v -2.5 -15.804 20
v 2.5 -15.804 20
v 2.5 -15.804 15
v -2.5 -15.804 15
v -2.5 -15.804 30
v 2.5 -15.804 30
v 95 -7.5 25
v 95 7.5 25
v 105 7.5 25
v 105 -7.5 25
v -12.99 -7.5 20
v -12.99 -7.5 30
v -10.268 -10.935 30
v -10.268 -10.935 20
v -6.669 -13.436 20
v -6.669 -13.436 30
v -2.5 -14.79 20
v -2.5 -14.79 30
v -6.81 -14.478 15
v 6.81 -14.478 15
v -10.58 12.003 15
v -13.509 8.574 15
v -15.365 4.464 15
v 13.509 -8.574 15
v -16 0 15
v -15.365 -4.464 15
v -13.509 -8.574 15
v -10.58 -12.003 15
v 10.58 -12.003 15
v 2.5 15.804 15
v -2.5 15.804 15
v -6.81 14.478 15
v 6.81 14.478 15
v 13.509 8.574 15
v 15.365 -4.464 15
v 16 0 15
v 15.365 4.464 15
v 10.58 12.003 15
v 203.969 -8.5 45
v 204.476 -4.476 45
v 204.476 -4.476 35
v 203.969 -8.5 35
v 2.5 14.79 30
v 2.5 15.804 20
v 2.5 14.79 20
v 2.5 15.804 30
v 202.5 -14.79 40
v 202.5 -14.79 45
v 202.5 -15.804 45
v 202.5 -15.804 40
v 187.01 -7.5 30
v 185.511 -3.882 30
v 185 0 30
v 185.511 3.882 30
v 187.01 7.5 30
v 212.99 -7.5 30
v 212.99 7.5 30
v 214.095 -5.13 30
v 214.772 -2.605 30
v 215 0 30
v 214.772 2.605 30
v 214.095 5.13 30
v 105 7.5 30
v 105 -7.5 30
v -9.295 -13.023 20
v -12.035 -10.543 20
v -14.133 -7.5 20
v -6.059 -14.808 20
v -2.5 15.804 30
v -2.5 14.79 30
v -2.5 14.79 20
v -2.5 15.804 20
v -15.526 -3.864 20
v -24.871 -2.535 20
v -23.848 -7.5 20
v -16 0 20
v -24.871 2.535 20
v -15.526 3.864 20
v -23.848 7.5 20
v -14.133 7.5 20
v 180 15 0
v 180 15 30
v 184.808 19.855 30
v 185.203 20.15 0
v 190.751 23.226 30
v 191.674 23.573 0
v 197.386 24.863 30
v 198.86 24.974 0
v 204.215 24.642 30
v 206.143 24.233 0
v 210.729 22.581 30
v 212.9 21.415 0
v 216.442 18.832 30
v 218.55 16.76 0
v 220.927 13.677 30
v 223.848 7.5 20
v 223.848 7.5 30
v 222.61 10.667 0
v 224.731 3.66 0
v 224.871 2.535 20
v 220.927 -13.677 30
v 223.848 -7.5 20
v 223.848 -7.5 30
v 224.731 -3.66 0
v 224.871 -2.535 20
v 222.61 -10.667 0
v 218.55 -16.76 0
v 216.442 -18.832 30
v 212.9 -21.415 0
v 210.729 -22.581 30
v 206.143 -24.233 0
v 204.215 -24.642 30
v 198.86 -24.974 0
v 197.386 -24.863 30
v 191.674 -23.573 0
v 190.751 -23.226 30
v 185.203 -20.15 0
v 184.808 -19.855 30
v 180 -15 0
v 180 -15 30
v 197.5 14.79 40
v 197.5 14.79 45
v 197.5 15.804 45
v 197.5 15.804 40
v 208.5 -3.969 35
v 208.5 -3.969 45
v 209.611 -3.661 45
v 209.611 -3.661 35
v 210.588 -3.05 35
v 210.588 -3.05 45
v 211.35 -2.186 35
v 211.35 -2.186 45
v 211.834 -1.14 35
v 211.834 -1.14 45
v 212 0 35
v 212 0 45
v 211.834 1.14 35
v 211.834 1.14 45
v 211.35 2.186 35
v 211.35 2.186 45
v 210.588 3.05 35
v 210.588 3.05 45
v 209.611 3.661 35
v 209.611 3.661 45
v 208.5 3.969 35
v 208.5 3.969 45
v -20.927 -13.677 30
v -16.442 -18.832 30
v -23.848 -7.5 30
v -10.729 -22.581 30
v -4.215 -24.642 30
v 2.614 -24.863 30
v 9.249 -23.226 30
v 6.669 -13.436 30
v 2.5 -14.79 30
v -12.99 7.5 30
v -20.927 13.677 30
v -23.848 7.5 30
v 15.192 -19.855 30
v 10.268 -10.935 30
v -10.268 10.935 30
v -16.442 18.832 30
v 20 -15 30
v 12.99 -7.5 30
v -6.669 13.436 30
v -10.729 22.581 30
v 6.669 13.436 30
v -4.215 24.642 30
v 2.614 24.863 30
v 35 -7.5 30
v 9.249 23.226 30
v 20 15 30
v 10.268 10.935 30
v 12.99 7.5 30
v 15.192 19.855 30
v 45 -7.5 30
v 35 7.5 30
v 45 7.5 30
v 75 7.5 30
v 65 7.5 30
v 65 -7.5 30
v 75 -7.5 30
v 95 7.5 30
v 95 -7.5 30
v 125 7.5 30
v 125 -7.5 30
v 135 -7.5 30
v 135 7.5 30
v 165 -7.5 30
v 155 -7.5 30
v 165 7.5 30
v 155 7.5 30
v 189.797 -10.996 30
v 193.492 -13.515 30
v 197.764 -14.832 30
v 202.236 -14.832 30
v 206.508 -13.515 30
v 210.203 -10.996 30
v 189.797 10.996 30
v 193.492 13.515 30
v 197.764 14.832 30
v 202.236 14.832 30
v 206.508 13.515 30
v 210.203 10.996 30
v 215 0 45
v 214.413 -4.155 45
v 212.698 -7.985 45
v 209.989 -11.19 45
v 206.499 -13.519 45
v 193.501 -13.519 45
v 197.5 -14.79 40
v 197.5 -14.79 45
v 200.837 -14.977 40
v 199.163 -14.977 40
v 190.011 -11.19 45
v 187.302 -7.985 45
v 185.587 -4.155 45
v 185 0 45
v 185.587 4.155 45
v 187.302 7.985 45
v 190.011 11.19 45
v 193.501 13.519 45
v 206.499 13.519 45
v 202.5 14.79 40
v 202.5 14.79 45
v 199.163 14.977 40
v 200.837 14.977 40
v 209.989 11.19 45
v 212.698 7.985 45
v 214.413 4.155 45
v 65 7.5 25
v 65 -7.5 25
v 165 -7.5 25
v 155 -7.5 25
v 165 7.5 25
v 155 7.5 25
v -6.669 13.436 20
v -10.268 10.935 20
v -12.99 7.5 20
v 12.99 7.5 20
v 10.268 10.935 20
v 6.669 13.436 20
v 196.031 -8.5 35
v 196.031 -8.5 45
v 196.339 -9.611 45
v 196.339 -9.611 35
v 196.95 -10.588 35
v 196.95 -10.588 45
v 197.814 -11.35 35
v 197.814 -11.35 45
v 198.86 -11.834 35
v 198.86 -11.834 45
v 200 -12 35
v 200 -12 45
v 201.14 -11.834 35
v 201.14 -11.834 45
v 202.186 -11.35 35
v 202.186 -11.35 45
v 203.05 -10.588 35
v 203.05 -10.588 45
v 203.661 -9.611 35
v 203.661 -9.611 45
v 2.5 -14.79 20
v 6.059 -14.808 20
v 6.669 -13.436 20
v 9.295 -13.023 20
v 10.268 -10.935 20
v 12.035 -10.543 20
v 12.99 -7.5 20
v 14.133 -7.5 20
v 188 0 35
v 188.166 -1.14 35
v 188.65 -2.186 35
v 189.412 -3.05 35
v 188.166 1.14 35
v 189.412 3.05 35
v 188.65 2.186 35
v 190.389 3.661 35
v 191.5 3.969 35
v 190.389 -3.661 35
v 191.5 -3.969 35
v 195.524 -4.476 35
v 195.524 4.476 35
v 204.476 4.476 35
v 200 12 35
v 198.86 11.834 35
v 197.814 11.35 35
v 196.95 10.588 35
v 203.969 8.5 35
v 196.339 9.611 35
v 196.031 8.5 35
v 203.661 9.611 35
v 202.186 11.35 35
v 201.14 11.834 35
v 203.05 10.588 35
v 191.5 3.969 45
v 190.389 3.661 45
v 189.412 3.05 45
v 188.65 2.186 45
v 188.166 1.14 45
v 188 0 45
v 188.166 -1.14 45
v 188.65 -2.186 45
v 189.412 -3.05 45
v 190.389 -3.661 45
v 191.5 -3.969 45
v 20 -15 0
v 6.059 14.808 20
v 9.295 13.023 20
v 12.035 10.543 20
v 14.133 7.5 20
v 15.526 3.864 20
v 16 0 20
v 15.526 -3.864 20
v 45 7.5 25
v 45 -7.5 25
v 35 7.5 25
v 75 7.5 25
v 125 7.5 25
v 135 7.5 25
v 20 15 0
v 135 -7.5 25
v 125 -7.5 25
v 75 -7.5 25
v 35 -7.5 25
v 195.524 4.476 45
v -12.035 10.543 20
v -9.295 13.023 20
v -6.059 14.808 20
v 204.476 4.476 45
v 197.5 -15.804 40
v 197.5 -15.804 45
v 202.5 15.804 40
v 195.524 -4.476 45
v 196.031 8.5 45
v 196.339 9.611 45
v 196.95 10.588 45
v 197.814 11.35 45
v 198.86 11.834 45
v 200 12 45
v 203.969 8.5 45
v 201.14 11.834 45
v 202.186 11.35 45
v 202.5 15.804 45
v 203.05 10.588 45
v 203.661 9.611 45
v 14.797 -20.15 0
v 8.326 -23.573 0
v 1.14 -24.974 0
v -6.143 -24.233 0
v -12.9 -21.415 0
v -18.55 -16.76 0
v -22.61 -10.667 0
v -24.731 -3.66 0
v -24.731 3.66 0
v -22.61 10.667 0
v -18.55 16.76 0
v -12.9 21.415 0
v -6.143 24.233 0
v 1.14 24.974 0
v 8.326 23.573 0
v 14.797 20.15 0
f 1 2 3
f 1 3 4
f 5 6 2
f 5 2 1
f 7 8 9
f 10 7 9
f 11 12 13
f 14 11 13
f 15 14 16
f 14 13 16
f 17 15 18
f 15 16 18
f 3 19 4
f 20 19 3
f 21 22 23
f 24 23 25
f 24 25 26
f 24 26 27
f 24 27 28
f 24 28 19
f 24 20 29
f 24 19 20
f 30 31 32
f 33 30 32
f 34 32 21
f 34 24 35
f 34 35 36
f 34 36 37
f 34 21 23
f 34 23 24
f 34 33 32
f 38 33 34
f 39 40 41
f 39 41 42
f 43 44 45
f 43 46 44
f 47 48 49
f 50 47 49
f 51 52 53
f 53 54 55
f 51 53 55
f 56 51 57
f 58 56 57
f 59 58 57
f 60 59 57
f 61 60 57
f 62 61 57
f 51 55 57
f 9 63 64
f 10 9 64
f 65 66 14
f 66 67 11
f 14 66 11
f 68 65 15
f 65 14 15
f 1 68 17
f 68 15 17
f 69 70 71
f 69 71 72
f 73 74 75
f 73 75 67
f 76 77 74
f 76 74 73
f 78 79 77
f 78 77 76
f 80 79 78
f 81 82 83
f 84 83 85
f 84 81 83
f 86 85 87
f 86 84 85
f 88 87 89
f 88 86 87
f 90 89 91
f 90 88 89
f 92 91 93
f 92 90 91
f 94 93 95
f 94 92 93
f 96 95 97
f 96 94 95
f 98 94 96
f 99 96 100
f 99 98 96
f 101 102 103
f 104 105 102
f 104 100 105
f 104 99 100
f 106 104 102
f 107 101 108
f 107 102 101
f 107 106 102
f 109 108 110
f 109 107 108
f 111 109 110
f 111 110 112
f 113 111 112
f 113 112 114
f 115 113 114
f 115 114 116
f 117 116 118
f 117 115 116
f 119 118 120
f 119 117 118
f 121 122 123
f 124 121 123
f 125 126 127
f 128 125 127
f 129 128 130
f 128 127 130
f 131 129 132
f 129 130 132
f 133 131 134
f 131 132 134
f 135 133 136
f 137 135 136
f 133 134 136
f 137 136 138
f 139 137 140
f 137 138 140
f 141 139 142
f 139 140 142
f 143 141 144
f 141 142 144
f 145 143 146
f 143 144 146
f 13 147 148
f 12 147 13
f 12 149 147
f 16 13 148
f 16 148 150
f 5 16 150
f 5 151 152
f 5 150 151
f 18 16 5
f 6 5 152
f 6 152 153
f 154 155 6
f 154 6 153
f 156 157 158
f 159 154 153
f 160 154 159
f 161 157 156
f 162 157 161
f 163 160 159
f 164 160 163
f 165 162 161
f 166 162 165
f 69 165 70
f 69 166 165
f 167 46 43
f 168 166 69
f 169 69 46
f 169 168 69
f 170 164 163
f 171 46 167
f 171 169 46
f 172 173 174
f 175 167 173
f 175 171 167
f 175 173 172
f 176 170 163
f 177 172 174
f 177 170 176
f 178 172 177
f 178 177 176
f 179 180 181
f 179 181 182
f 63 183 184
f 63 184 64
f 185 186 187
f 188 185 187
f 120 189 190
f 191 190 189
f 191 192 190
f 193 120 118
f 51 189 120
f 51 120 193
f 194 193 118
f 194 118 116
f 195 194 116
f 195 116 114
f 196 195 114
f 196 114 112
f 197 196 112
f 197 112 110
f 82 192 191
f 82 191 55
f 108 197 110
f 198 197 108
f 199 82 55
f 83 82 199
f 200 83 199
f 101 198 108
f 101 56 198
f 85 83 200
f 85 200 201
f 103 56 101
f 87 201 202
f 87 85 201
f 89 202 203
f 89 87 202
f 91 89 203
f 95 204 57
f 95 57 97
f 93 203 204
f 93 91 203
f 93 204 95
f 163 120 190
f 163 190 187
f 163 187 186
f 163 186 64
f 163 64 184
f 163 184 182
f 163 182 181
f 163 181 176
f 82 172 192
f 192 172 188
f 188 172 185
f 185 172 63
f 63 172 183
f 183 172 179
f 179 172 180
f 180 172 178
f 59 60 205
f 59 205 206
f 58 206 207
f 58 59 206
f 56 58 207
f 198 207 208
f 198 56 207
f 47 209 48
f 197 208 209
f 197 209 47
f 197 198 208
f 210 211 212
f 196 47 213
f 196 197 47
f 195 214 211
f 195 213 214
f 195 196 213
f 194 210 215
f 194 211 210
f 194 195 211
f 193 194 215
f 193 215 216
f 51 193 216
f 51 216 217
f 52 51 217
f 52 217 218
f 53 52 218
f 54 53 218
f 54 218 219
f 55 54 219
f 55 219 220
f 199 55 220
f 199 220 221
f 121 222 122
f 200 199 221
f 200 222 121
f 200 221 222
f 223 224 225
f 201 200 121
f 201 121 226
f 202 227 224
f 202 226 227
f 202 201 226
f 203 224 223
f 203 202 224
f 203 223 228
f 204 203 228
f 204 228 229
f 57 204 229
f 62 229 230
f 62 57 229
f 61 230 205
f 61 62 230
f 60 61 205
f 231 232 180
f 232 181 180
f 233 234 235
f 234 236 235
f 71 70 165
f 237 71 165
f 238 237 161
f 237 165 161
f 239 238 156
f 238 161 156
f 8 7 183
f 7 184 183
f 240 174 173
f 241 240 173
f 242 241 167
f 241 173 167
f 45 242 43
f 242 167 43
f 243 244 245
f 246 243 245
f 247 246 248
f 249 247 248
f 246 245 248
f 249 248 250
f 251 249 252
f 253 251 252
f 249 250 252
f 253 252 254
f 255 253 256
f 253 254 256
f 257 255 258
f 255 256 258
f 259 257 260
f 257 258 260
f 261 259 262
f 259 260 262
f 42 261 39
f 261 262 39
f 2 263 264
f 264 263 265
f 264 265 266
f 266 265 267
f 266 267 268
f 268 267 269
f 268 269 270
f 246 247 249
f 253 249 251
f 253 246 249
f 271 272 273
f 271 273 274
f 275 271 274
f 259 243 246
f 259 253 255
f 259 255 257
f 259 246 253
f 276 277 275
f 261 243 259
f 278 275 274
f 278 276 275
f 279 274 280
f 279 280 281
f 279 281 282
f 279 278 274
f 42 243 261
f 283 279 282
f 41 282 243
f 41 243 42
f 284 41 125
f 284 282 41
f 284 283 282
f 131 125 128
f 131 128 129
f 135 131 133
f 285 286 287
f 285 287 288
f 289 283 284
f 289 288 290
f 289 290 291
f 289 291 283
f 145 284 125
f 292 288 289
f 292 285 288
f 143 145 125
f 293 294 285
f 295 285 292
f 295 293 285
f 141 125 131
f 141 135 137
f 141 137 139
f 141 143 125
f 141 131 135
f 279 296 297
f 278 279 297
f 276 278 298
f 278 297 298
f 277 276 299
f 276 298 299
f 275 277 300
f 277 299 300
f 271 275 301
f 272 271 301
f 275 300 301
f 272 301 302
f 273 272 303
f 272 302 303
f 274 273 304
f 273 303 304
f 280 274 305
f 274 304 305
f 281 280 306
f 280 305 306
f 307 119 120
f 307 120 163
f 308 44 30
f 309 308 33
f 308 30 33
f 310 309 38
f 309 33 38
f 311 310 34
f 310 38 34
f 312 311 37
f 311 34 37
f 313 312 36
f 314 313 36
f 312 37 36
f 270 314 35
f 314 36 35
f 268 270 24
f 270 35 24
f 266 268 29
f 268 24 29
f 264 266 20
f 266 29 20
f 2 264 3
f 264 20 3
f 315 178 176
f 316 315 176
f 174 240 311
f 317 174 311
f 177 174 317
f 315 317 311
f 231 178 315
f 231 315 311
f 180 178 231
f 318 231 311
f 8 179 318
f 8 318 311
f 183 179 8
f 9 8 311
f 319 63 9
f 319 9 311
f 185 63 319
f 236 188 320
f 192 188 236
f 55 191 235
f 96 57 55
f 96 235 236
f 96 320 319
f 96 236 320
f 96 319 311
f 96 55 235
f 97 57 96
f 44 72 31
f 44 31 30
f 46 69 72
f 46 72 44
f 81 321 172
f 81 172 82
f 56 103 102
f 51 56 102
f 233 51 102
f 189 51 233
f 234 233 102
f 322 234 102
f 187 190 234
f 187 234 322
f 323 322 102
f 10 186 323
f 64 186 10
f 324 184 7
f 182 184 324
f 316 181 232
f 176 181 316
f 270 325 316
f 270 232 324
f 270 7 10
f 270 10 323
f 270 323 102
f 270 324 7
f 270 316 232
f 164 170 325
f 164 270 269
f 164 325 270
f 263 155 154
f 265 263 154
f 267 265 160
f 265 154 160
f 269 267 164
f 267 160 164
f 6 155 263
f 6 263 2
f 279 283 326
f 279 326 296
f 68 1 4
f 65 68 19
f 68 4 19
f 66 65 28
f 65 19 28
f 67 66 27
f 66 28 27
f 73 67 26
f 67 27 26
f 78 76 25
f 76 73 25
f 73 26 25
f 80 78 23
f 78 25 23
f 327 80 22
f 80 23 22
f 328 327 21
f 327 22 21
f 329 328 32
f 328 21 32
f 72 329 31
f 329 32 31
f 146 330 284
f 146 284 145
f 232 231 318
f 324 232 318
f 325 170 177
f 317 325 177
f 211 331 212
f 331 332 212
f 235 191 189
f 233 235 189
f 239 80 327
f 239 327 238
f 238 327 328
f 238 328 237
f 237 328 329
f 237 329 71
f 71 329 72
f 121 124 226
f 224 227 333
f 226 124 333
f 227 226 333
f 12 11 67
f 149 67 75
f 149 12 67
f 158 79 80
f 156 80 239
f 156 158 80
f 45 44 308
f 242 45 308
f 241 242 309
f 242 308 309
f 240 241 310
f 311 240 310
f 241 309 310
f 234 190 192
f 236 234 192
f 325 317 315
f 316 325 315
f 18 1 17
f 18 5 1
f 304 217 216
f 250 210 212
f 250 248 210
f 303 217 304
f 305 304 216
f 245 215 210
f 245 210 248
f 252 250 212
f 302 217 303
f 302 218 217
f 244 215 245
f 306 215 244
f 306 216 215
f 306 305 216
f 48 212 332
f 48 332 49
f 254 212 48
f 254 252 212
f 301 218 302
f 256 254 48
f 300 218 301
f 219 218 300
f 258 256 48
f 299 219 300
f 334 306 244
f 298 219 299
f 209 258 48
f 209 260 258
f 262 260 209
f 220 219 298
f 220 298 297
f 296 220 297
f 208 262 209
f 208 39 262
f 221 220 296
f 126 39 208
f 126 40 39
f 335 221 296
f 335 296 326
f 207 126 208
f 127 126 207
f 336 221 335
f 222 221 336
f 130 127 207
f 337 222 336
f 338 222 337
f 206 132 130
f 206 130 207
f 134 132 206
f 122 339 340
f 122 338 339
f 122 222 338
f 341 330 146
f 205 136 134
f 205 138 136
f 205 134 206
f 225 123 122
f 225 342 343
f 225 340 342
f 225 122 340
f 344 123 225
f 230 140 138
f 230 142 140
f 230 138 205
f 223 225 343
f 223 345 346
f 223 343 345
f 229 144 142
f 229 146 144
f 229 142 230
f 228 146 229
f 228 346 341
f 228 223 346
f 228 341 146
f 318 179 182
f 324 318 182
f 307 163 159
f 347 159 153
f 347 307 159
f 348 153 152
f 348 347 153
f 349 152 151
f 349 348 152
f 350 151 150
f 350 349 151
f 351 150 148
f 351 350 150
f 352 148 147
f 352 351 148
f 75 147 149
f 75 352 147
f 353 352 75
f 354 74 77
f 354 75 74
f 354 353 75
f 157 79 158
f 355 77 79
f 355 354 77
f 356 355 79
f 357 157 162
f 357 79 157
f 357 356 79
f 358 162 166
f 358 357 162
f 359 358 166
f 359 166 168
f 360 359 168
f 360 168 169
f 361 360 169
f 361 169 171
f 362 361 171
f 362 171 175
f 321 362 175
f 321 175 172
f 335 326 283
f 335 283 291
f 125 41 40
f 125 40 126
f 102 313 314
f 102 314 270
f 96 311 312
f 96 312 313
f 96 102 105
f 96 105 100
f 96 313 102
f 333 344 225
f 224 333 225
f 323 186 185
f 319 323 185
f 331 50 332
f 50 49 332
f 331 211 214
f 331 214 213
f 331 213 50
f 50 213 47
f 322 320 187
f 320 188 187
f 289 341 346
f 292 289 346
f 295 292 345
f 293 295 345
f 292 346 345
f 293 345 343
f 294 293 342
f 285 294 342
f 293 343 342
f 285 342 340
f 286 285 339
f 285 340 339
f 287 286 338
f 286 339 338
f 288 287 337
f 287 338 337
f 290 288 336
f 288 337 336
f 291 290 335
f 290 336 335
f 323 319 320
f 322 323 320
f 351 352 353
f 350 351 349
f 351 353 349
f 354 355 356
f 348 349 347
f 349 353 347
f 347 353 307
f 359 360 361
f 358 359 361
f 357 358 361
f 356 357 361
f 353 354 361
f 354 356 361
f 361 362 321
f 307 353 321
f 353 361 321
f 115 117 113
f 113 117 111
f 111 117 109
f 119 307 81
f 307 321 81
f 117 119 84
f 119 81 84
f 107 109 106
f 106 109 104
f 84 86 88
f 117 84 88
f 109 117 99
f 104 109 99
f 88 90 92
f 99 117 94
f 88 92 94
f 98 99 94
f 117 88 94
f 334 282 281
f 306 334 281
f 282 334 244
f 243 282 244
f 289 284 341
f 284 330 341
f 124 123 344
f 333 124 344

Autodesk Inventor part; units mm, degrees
ref_plane "YZ Plane" through (0, 0, 0) normal (1, 0, 0) x (0, 1, 0)
ref_plane "XZ Plane" through (0, 0, 0) normal (0, 1, 0) x (-1, 0, 0)
ref_plane "XY Plane" through (0, 0, 0) normal (0, 0, 1) x (1, 0, 0)
sketch "Szkic1" plane through (0, 0, 0) normal (0, 0, 1) x (1, 0, 0)
  arc A0 (20, 15) -> (-20, 15) centre (0, 0) ccw
  line L0 (20, 15) -> (100, 15)
  line L1 (100, 15) -> (100, -15)
  line L2 (100, -15) -> (20, -15)
  arc A1 (180, -15) -> (180, 15) centre (200, 0) ccw
  line L3 (180, 15) -> (100, 15)
  line L4 (100, -15) -> (180, -15)
  arc A2 (-20, 15) -> (20, -15) centre (0, 0) ccw
  dimension "d0" = 50
  dimension "d1" = 30
  dimension "d2" = 200
extrude "kształt" add sketch "Szkic1" along normal blind 30
sketch "Szkic2" plane through (0, 0, 30) normal (0, 0, 1) x (1, 0, 0)
  arc A0 (20, 15) -> (20, -15) centre (0, 0) ccw projected
  line L0 (20, -15) -> (180, -15) projected
  arc A1 (180, -15) -> (180, 15) centre (200, 0) ccw projected
  line L1 (180, 15) -> (20, 15) projected
  line L2 (-23.8485, 7.5) -> (223.8485, 7.5)
  line L3 (223.8485, -7.5) -> (-73.8485, -7.5)
  point P0 (-23.8485, -7.5)
  dimension "d5" = 15
extrude "rowek na kable" cut sketch "Szkic2" against normal blind 10 contours L2 A1 L3 A0
sketch "Szkic3" plane through (0, 0, 30) normal (0, 0, 1) x (1, 0, 0)
  arc A0 (223.8485, 7.5) -> (180, 15) centre (200, 0) ccw projected
  circle A1 centre (200, 0) radius 15
  point P0 (0, 0)
  dimension "d8" = 30
extrude "odstająćy cosik" add sketch "Szkic3" along normal blind 15
sketch "Szkic4" plane through (0, 0, 30) normal (0, 0, 1) x (1, 0, 0)
  circle A0 centre (0, 0) radius 15
  dimension "d11" = 30
extrude "wgłebiający cosik" cut sketch "Szkic4" against normal blind 15
sketch "Szkic5" plane through (0, 0, 30) normal (0, 0, 1) x (1, 0, 0)
  arc A0 (12.9904, 7.5) -> (-12.9904, 7.5) centre (0, 0) ccw projected
  line L0 (12.9904, 7.5) -> (187.0096, 7.5) projected
  arc A1 (212.9904, 7.5) -> (187.0096, 7.5) centre (200, 0) ccw projected
  line L1 (212.9904, 7.5) -> (223.8485, 7.5) projected
  arc A2 (223.8485, 7.5) -> (180, 15) centre (200, 0) ccw projected
  line L2 (180, 15) -> (20, 15) projected
  arc A3 (20, 15) -> (-23.8485, 7.5) centre (0, 0) ccw projected
  line L3 (-23.8485, 7.5) -> (-12.9904, 7.5) projected
  arc A4 (-12.9904, -7.5) -> (12.9904, -7.5) centre (0, 0) ccw projected
  line L4 (-12.9904, -7.5) -> (-23.8485, -7.5) projected
  arc A5 (-23.8485, -7.5) -> (20, -15) centre (0, 0) ccw projected
  line L5 (20, -15) -> (180, -15) projected
  arc A6 (180, -15) -> (223.8485, -7.5) centre (200, 0) ccw projected
  line L6 (223.8485, -7.5) -> (212.9904, -7.5) projected
  arc A7 (187.0096, -7.5) -> (212.9904, -7.5) centre (200, 0) ccw projected
  line L7 (187.0096, -7.5) -> (12.9904, -7.5) projected
  line L8 (35, 7.5) -> (45, 7.5)
  line L9 (45, 7.5) -> (45, -7.5)
  line L10 (45, -7.5) -> (35, -7.5)
  line L11 (35, -7.5) -> (35, 7.5)
  arc A8 (-23.8485, -7.5) -> (20, -15) centre (0, 0) ccw projected
  line L12 (65, -7.5) -> (65, 7.5)
  line L13 (75, 7.5) -> (75, -7.5)
  line L14 (75, -7.5) -> (65, -7.5)
  line L15 (65, 7.5) -> (75, 7.5)
  line L16 (95, -7.5) -> (95, 7.5)
  line L17 (105, 7.5) -> (105, -7.5)
  line L18 (105, -7.5) -> (95, -7.5)
  line L19 (95, 7.5) -> (105, 7.5)
  line L20 (125, -7.5) -> (125, 7.5)
  line L21 (135, 7.5) -> (135, -7.5)
  line L22 (135, -7.5) -> (125, -7.5)
  line L23 (125, 7.5) -> (135, 7.5)
  line L24 (155, -7.5) -> (155, 7.5)
  line L25 (165, 7.5) -> (165, -7.5)
  line L26 (165, -7.5) -> (155, -7.5)
  line L27 (155, 7.5) -> (165, 7.5)
  arc A9 (223.8485, 7.5) -> (180, 15) centre (200, 0) ccw projected
  line L28 (0, 0) -> (100, 0) construction
  line L29 (100, -7.5) -> (100, 7.5) construction
  line L30 (100, 0) -> (200, 0) construction
  point P0 (35, -7.5)
  point P1 (75, -7.5)
  point P2 (75, 7.5)
  point P3 (65, 7.5)
  point P4 (165, -7.5)
  point P5 (165, 7.5)
  point P6 (155, 7.5)
  point P7 (155, -7.5)
  point P8 (135, -7.5)
  point P9 (135, 7.5)
  point P10 (125, 7.5)
  point P11 (105, -7.5)
  point P12 (105, 7.5)
  point P13 (95, 7.5)
  dimension "d15" = 10
  dimension "d18" = 30
extrude "wzmocnienie" add sketch "Szkic5" against normal blind 5 contours L0 L9 L7 L11 | L0 L13 L7 L12 | L0 L17 L7 L16 | L0 L21 L7 L20 | L25 L7 L24 L0
sketch "Szkic6" plane through (200, 0, 45) normal (0, 0, 1) x (1, 0, 0)
  circle A0 centre (0, 0) radius 15 projected
  arc A1 (2.5, 15.8035) -> (2.5, -15.8035) centre (0, 0) ccw construction
  line L0 (-2.5, 15.8035) -> (2.5, 15.8035)
  line L1 (2.5, 15.8035) -> (2.5, 14.7902)
  line L2 (2.5, -15.8035) -> (-2.5, -15.8035)
  line L3 (-2.5, -15.8035) -> (-2.5, -14.7902)
  line L4 (2.5, 14.7902) -> (2.5, -14.7902) construction
  line L5 (-2.5, 14.7902) -> (-2.5, 15.8035)
  line L6 (-2.5, -14.7902) -> (-2.5, 14.7902) construction
  line L7 (2.5, -14.7902) -> (2.5, -15.8035)
  point P0 (-200, 0)
  dimension "d25" = 32
  dimension "d27" = 5
extrude "złobek" add sketch "Szkic6" against normal blind 5 contours A0 L5 L0 L1 | L7 L2 L3 A0
sketch "Szkic7" plane through (0, 0, 30) normal (0, 0, 1) x (1, 0, 0)
  circle A0 centre (0, 0) radius 16 construction
  line L0 (-2.5, 15.8035) -> (2.5, 15.8035)
  line L1 (2.5, -15.8035) -> (-2.5, -15.8035)
  arc A1 (12.9904, 7.5) -> (-12.9904, 7.5) centre (0, 0) ccw projected
  arc A2 (-12.9904, -7.5) -> (12.9904, -7.5) centre (0, 0) ccw projected
  line L2 (2.5, 15.8035) -> (2.5, 14.7902)
  line L3 (2.5, -14.7902) -> (2.5, -15.8035)
  line L4 (-2.5, -15.8035) -> (-2.5, -14.7902)
  line L5 (-2.5, 14.7902) -> (-2.5, 15.8035)
  arc A3 (2.5, 14.7902) -> (-2.5, 14.7902) centre (0, 0) ccw
  arc A4 (-2.5, -14.7902) -> (2.5, -14.7902) centre (0, 0) ccw
  point P0 (2.5, 15.2968)
  dimension "d30" = 32
  dimension "d32" = 5
extrude "wklęsły żłobek" cut sketch "Szkic7" against normal up to surface (15 mm away)
sketch "Szkic8" plane through (0, 0, 15) normal (0, 0, 1) x (1, 0, 0)
  arc A0 (2.5, -14.7902) -> (2.5, 14.7902) centre (0, 0) ccw projected
  line L0 (2.5, 15.8035) -> (2.5, 14.7902) projected
  line L1 (-2.5, 15.8035) -> (2.5, 15.8035) projected
  line L2 (-2.5, 14.7902) -> (-2.5, 15.8035) projected
  arc A1 (-2.5, 14.7902) -> (-2.5, -14.7902) centre (0, 0) ccw projected
  line L3 (-2.5, -15.8035) -> (-2.5, -14.7902) projected
  line L4 (2.5, -15.8035) -> (-2.5, -15.8035) projected
  line L5 (2.5, -14.7902) -> (2.5, -15.8035) projected
  circle A2 centre (0, 0) radius 16
  circle A3 centre (0, 0) radius 15
extrude "rowek" cut sketch "Szkic8" along normal blind 5 contours A0 L0 A2 L5 | L3 A2 L2 A1
sketch "Szkic12" plane through (0, 0, 45) normal (0, 0, 1) x (1, 0, 0)
  arc A0 (202.5, -14.7902) -> (202.5, 14.7902) centre (200, 0) ccw projected
  circle A1 centre (200, 0) radius 5 construction
  arc A2 (203.9686, 8.5) -> (196.0314, 8.5) centre (200, 8) ccw
  line L0 (195.0392, 0.625) -> (196.0314, 8.5)
  line L1 (204.9608, 0.625) -> (203.9686, 8.5)
  line L2 (199.375, 4.9608) -> (191.5, 3.9686)
  arc A3 (191.5, 3.9686) -> (191.5, -3.9686) centre (192, 0) ccw
  line L3 (199.375, -4.9608) -> (191.5, -3.9686)
  line L4 (195.0392, -0.625) -> (196.0314, -8.5)
  arc A4 (196.0314, -8.5) -> (203.9686, -8.5) centre (200, -8) ccw
  line L5 (204.9608, -0.625) -> (203.9686, -8.5)
  line L6 (200.625, -4.9608) -> (208.5, -3.9686)
  arc A5 (208.5, -3.9686) -> (208.5, 3.9686) centre (208, 0) ccw
  line L7 (200.625, 4.9608) -> (208.5, 3.9686)
  point P0 (0, 0)
  point P1 (195.5244, 4.4756)
  point P2 (195.5244, -4.4756)
  point P3 (204.4756, -4.4756)
  point P4 (204.4756, 4.4756)
  dimension "d53" = 10
  dimension "d54" = 8
  dimension "d55" = 8
  dimension "d58" = 360
extrude "Wyciągnięcie proste12" cut sketch "Szkic12" against normal blind 10
properties part number "2stopien" material "Tworzywo sztuczne ABS"
